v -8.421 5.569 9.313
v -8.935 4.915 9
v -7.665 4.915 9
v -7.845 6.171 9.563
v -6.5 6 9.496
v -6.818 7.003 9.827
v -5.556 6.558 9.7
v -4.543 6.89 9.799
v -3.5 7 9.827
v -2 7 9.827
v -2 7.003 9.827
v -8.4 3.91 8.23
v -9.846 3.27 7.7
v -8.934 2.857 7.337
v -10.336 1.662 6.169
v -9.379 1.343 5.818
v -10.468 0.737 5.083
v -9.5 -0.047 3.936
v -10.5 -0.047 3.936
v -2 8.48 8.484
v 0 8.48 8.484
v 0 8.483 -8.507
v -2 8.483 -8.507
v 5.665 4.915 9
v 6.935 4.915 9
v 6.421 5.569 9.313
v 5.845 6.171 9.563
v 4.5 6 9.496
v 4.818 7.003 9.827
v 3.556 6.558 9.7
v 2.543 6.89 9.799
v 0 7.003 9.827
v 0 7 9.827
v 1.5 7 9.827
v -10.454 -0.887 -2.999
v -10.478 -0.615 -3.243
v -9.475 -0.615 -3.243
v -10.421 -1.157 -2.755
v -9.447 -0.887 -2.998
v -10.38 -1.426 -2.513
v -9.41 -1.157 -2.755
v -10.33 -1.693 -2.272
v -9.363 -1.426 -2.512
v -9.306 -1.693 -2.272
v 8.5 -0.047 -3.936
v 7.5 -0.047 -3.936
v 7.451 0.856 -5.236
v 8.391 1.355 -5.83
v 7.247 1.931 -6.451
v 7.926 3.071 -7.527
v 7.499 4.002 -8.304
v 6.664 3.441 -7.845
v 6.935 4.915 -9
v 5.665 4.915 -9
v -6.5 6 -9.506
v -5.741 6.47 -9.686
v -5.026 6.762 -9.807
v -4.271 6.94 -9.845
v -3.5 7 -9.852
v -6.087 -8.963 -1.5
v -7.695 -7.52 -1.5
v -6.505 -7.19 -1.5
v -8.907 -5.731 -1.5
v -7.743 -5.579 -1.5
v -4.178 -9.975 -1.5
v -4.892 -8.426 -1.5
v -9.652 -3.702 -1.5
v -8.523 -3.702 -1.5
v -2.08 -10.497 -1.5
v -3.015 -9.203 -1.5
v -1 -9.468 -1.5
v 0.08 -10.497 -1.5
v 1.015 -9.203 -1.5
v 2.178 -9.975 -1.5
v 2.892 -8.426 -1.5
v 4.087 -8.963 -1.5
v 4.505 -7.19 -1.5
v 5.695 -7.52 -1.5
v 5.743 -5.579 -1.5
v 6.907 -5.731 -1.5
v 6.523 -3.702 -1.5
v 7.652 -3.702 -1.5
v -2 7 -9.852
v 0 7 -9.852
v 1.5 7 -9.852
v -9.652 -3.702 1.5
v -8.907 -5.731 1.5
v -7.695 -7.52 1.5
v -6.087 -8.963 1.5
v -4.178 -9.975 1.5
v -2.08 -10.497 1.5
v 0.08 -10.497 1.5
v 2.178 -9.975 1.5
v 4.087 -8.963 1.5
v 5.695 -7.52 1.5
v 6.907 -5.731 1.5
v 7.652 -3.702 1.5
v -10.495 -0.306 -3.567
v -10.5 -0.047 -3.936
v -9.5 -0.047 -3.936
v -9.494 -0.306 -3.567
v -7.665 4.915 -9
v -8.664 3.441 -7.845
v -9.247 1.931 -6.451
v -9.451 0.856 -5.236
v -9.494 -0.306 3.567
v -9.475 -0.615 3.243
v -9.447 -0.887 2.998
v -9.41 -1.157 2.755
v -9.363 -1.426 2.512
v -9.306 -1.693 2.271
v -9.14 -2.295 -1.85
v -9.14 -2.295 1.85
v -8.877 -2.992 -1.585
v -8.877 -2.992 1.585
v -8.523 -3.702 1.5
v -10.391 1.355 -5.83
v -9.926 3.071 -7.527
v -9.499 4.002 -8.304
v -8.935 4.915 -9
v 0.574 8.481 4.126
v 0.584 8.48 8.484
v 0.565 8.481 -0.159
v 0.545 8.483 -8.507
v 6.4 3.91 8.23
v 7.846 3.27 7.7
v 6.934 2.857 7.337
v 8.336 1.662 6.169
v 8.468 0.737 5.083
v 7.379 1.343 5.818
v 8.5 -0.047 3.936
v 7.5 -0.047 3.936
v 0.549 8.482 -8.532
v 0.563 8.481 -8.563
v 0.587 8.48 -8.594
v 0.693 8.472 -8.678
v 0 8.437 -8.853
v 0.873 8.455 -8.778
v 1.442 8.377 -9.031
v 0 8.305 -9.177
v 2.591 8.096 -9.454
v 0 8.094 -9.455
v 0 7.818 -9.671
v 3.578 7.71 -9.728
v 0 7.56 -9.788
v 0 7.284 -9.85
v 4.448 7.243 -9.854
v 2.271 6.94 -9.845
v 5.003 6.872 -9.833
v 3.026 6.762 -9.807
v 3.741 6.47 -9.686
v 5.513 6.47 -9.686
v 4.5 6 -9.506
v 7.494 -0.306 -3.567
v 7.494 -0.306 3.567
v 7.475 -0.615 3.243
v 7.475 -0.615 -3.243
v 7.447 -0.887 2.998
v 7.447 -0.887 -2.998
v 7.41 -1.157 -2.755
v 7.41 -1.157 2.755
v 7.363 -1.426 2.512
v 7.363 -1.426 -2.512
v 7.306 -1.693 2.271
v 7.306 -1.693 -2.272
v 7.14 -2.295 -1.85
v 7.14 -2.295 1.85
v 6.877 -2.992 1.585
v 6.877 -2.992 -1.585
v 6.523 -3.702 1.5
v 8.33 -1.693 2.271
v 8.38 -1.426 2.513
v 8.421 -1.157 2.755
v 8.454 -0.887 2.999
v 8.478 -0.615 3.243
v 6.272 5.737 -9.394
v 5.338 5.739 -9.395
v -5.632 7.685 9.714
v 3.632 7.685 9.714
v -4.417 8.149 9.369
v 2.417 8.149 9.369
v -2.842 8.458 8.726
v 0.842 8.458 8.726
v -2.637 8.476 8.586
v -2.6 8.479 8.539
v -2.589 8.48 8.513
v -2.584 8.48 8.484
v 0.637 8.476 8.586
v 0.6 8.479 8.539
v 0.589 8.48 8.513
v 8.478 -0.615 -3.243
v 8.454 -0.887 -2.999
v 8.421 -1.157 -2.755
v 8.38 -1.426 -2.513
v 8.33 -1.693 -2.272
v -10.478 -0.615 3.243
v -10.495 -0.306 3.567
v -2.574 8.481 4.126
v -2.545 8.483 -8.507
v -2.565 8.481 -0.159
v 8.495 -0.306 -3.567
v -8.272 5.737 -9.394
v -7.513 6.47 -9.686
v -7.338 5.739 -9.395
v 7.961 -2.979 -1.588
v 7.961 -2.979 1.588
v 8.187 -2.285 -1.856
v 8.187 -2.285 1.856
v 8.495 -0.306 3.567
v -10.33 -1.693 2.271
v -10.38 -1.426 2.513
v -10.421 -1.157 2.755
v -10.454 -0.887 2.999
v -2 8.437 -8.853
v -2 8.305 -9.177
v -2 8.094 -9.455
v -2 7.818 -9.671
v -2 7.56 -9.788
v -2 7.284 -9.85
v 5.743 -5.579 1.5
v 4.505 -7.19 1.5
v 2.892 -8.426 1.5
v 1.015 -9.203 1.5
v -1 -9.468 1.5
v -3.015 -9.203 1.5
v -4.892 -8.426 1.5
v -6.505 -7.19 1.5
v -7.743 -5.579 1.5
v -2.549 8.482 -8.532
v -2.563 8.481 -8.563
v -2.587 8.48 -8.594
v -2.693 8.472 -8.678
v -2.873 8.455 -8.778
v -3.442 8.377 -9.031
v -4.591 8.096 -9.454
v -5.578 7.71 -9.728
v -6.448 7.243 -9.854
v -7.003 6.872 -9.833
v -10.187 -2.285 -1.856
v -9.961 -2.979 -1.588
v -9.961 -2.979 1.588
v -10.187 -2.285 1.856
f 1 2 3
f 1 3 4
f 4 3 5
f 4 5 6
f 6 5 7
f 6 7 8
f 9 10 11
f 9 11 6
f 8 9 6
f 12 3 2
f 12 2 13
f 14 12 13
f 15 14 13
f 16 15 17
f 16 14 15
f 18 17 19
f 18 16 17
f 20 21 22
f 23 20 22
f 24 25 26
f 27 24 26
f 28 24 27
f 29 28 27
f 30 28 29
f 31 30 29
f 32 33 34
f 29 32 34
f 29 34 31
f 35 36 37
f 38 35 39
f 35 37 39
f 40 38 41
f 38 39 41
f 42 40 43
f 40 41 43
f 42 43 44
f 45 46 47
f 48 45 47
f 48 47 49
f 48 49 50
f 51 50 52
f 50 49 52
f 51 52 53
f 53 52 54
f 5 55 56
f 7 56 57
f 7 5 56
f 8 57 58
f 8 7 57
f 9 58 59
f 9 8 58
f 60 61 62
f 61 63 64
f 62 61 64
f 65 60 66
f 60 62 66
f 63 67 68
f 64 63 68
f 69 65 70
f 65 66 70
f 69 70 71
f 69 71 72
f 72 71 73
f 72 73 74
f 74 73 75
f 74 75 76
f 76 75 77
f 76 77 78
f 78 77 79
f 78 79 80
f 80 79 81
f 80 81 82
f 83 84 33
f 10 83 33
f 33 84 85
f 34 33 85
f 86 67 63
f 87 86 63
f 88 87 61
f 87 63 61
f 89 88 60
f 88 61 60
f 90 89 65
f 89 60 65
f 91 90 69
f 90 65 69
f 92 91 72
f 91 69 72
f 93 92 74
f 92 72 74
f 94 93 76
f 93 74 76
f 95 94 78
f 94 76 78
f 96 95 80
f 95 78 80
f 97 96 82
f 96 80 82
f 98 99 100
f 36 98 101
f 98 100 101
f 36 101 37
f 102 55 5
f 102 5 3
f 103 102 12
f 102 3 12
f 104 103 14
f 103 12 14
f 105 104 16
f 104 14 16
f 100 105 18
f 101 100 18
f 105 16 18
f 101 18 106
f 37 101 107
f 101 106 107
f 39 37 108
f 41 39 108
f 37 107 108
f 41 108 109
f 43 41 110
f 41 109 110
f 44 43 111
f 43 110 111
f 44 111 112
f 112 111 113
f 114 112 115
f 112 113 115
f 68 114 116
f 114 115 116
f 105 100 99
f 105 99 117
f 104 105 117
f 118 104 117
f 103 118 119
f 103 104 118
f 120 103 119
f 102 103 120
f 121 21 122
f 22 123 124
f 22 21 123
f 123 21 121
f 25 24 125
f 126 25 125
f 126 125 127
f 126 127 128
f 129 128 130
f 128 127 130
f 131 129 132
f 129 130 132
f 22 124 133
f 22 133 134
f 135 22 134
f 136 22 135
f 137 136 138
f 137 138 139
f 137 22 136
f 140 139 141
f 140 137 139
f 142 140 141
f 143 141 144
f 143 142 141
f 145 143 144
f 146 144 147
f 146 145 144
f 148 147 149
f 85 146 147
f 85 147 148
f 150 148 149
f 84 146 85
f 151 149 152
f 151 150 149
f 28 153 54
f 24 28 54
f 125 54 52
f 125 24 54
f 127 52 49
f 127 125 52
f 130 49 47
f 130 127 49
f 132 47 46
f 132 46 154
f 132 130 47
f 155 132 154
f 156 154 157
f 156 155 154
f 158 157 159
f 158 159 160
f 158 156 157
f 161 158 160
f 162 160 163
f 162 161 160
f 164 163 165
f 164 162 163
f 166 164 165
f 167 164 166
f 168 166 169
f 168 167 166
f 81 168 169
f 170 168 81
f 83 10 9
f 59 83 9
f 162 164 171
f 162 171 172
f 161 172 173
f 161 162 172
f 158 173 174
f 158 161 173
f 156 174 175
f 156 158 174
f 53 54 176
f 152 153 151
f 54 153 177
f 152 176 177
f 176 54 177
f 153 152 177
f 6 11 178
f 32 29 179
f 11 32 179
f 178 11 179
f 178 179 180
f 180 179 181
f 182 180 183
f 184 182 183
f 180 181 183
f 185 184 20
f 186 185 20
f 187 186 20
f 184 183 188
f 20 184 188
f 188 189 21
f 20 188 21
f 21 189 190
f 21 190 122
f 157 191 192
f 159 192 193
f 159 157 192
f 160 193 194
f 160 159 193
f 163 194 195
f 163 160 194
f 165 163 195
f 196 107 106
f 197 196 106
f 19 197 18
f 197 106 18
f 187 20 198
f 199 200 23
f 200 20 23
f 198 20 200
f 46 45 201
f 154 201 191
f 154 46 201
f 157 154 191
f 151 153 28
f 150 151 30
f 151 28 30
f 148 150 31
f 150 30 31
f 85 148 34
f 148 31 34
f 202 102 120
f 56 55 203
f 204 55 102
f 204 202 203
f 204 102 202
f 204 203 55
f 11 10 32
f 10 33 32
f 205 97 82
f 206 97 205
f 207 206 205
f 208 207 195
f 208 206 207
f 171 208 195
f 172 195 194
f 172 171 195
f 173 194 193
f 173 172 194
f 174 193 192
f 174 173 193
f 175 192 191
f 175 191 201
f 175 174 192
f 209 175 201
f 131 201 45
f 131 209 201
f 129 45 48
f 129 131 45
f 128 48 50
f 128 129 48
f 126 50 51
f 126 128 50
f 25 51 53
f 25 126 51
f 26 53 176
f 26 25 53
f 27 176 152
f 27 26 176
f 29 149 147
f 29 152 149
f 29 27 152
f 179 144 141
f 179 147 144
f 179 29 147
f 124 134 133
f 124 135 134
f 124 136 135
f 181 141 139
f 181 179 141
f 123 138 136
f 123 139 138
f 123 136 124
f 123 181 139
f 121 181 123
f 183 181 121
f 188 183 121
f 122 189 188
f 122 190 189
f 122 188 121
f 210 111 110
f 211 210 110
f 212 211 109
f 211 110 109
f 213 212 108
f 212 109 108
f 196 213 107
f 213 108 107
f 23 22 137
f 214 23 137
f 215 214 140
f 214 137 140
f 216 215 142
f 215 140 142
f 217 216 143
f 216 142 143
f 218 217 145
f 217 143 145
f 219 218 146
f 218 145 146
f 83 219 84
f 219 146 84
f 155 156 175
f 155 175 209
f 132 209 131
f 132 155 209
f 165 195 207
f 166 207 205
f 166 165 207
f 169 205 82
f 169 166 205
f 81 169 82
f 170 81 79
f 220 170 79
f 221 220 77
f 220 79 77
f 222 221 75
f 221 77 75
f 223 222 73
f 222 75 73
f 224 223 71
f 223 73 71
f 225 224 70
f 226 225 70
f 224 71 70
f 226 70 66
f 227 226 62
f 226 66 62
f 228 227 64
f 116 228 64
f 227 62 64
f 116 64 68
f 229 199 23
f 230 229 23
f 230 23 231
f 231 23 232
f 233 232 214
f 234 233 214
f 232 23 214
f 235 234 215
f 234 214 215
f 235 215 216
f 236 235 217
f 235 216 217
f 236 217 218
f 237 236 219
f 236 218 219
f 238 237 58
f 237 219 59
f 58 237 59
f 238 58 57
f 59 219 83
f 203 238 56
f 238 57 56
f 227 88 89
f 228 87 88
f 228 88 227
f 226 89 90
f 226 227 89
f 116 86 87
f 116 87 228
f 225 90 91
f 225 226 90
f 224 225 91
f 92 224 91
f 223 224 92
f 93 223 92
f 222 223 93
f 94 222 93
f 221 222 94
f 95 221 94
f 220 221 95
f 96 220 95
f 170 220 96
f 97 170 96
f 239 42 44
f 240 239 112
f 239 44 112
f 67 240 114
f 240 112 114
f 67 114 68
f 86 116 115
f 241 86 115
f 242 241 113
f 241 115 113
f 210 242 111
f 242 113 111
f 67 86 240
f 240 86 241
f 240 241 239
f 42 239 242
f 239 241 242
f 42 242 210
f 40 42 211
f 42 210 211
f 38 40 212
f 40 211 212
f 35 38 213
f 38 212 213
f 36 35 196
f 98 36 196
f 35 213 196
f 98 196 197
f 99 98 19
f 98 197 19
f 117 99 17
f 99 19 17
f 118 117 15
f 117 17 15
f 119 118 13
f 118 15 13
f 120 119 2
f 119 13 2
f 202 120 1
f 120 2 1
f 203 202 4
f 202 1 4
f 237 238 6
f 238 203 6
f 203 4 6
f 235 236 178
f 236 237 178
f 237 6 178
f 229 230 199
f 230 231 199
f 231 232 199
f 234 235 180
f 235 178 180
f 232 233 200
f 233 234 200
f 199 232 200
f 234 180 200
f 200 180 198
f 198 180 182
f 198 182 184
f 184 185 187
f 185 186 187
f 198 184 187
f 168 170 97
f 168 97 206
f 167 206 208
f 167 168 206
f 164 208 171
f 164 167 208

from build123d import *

# Parameters (mm, degrees)
RESSALTO_EXTRUS_O1_DEPTH  = 10
CORTE_EXTRUS_O8_OUTLINE_W = 20
CORTE_EXTRUS_O8_OUTLINE_H = 20
CORTE_EXTRUS_O8_DEPTH     = 8.5
RESSALTO_EXTRUS_O2_START  = 1
RESSALTO_EXTRUS_O2_DEPTH  = 1
VARREDURA3_START          = -1.500007282
VARREDURA3_DEPTH          = 3
CORTE_EXTRUS_O9_DEPTH     = 15.5
FILETE1_R                 = 5


# Read off the part's stored shape, not the designer's step: Corte-extrusão8, Varredura3
with BuildPart() as part:
    # Esboço1 → Ressalto-extrusão1 (new, symmetric)
    with BuildSketch(Plane.XY):
        with BuildLine():
            Line((0, 8.5), (0, 7))
            Line((0, 7), (2.692582404, 7))
            ThreePointArc((2.692582404, 7), (7.373940602, -1.369306394), (0, -7.5))
            Line((0, -7.5), (0, -8.5))
            ThreePointArc((0, -8.5), (8.5, 0), (0, 8.5))
        make_face()
    extrude(amount=RESSALTO_EXTRUS_O1_DEPTH, both=True)

    # Corte-extrusão8 outline → Corte-extrusão8 (cut)
    with BuildSketch(Plane(origin=(0, 0, 0), x_dir=(0, 0, -1), z_dir=(1, 0, 0))):
        Rectangle(CORTE_EXTRUS_O8_OUTLINE_W, CORTE_EXTRUS_O8_OUTLINE_H)
        with BuildLine():
            add(Edge.make_bspline(
                [(9.000007282, 4.914510614), (9.447062759, 5.785868524), (9.685629081, 6.469892836)],
                knots=[0, 0, 0, 0.163868034, 0.163868034, 0.163868034], degree=2))
            add(Edge.make_bspline(
                [(3.935539792, -0.04688611), (4.779617707, 0.456269007), (6.467773537, 1.786323577), (8.155929367, 3.763866822), (9.000007282, 4.914510614)],
                knots=[0.718640695, 0.718640695, 0.718640695, 0.718640695, 0.859320348, 1, 1, 1, 1], degree=3))
            ThreePointArc((3.935539792, -0.04688611), (3.567999305, -0.305127766), (3.243137148, -0.615352428))
            Line((3.243137148, -0.615352428), (2.271512773, -1.693435261))
            ThreePointArc((2.271512773, -1.693435261), (1.699517724, -2.626111152), (1.500007282, -3.701870529))
            Line((1.500007282, -3.701870529), (-1.499992718, -3.701870529))
            ThreePointArc((-1.499992718, -3.701870529), (-1.69950316, -2.626111152), (-2.271498209, -1.693435261))
            Line((-2.271498209, -1.693435261), (-3.243122584, -0.615352428))
            ThreePointArc((-3.243122584, -0.615352428), (-3.567984742, -0.305127766), (-3.935525229, -0.04688611))
            add(Edge.make_bspline(
                [(-8.999992718, 4.914510614), (-8.155914803, 3.763866822), (-6.467758973, 1.786323577), (-4.779603143, 0.456269007), (-3.935525229, -0.04688611)],
                knots=[0, 0, 0, 0, 0.140679652, 0.281359305, 0.281359305, 0.281359305, 0.281359305], degree=3))
            add(Edge.make_bspline(
                [(-8.999992718, 4.914510614), (-9.619273552, 6.143045831), (-9.827290671, 7.002933405)],
                knots=[0, 0, 0, 0.226449118, 0.226449118, 0.226449118], degree=2))
            ThreePointArc((-9.827290671, 7.002933405), (-9.482547244, 8.038405471), (-8.484479959, 8.479894004))
            Line((-8.484479959, 8.479894004), (8.506836552, 8.482513232))
            ThreePointArc((8.506836552, 8.482513232), (9.673048984, 7.814043651), (9.685629081, 6.469892836))
        make_face(mode=Mode.SUBTRACT)
    extrude(amount=CORTE_EXTRUS_O8_DEPTH, mode=Mode.SUBTRACT)

    # Esboço22 → Ressalto-extrusão2 (add)
    with BuildSketch(Plane.ZY.offset(RESSALTO_EXTRUS_O2_START)):
        with BuildLine():
            Line((-9.85199593, 7), (9.826580108, 6.999999994))
            Line((9.826580108, 6.999999994), (9.827290671, 7.002933405))
            ThreePointArc((9.827290671, 7.002933405), (9.482547244, 8.038405471), (8.484479959, 8.479894004))
            Line((8.484479959, 8.479894004), (-8.506836552, 8.48251324))
            ThreePointArc((-8.506836552, 8.48251324), (-9.507748545, 8.039169154), (-9.85199593, 7))
        make_face()
    extrude(amount=-RESSALTO_EXTRUS_O2_DEPTH)

    # Espelhar17: part across plane


with BuildPart() as part_1:
    add(part.part)
    add(part.part.mirror(Plane(origin=(-1, 0, 0), x_dir=(0, 0, 1), z_dir=(1, 0, 0))))

    # Varredura3 outline → Varredura3 (add)
    with BuildSketch(Plane.XY.offset(VARREDURA3_START)):
        with BuildLine():
            ThreePointArc((6.52274134, -3.701870529), (6.829918041, -3.098744835), (7.081469689, -2.470381964))
            Line((7.081469689, -2.470381964), (6.760891253, -2.353494698))
            ThreePointArc((6.760891253, -2.353494698), (6.671498267, -3.032925038), (6.52274134, -3.701870529))
        make_face()
        with BuildLine():
            Line((7.651545895, -3.701870529), (6.52274134, -3.701870529))
            ThreePointArc((6.52274134, -3.701870529), (-1, -9.46822023), (-8.52274134, -3.701870529))
            Line((-8.52274134, -3.701870529), (-9.651545895, -3.701870529))
            ThreePointArc((-9.651545895, -3.701870529), (-1, -10.563106097), (7.651545895, -3.701870529))
        make_face()
    extrude(amount=VARREDURA3_DEPTH)

    # Esboço24 → Corte-extrusão9 (cut, symmetric)
    with BuildSketch(Plane.XY):
        with BuildLine():
            Line((-4.692582404, 7), (2.692582404, 7))
            ThreePointArc((2.692582404, 7), (4.307155609, 6.139903139), (5.665473098, 4.914510614))
            ThreePointArc((5.665473098, 4.914510614), (7.034580308, 2.600899823), (7.499853445, -0.04688611))
            ThreePointArc((7.499853445, -0.04688611), (7.492676559, -0.331357775), (7.474713465, -0.615352428))
            ThreePointArc((7.474713465, -0.615352428), (7.410147472, -1.157460341), (7.30631761, -1.693435261))
            ThreePointArc((7.30631761, -1.693435261), (6.987071698, -2.725954711), (6.52274134, -3.701870529))
            ThreePointArc((6.52274134, -3.701870529), (-1, -9.46822023), (-8.52274134, -3.701870529))
            ThreePointArc((-8.52274134, -3.701870529), (-8.987071698, -2.725954711), (-9.30631761, -1.693435261))
            ThreePointArc((-9.30631761, -1.693435261), (-9.410147472, -1.157460341), (-9.474713465, -0.615352428))
            ThreePointArc((-9.474713465, -0.615352428), (-9.492676559, -0.331357775), (-9.499853445, -0.04688611))
            ThreePointArc((-9.499853445, -0.04688611), (-9.034580308, 2.600899823), (-7.665473098, 4.914510614))
            ThreePointArc((-7.665473098, 4.914510614), (-6.307155609, 6.139903139), (-4.692582404, 7))
        make_face()
    extrude(amount=CORTE_EXTRUS_O9_DEPTH, both=True, mode=Mode.SUBTRACT)

    # Filete1
    filete1_edges = [part_1.edges().sort_by_distance(p)[0] for p in [
        (-4.692582404, 7, -0.01270694),
        (2.692582404, 7, -0.01270694),
    ]]
    fillet(filete1_edges, radius=FILETE1_R)


solid = part_1.part
